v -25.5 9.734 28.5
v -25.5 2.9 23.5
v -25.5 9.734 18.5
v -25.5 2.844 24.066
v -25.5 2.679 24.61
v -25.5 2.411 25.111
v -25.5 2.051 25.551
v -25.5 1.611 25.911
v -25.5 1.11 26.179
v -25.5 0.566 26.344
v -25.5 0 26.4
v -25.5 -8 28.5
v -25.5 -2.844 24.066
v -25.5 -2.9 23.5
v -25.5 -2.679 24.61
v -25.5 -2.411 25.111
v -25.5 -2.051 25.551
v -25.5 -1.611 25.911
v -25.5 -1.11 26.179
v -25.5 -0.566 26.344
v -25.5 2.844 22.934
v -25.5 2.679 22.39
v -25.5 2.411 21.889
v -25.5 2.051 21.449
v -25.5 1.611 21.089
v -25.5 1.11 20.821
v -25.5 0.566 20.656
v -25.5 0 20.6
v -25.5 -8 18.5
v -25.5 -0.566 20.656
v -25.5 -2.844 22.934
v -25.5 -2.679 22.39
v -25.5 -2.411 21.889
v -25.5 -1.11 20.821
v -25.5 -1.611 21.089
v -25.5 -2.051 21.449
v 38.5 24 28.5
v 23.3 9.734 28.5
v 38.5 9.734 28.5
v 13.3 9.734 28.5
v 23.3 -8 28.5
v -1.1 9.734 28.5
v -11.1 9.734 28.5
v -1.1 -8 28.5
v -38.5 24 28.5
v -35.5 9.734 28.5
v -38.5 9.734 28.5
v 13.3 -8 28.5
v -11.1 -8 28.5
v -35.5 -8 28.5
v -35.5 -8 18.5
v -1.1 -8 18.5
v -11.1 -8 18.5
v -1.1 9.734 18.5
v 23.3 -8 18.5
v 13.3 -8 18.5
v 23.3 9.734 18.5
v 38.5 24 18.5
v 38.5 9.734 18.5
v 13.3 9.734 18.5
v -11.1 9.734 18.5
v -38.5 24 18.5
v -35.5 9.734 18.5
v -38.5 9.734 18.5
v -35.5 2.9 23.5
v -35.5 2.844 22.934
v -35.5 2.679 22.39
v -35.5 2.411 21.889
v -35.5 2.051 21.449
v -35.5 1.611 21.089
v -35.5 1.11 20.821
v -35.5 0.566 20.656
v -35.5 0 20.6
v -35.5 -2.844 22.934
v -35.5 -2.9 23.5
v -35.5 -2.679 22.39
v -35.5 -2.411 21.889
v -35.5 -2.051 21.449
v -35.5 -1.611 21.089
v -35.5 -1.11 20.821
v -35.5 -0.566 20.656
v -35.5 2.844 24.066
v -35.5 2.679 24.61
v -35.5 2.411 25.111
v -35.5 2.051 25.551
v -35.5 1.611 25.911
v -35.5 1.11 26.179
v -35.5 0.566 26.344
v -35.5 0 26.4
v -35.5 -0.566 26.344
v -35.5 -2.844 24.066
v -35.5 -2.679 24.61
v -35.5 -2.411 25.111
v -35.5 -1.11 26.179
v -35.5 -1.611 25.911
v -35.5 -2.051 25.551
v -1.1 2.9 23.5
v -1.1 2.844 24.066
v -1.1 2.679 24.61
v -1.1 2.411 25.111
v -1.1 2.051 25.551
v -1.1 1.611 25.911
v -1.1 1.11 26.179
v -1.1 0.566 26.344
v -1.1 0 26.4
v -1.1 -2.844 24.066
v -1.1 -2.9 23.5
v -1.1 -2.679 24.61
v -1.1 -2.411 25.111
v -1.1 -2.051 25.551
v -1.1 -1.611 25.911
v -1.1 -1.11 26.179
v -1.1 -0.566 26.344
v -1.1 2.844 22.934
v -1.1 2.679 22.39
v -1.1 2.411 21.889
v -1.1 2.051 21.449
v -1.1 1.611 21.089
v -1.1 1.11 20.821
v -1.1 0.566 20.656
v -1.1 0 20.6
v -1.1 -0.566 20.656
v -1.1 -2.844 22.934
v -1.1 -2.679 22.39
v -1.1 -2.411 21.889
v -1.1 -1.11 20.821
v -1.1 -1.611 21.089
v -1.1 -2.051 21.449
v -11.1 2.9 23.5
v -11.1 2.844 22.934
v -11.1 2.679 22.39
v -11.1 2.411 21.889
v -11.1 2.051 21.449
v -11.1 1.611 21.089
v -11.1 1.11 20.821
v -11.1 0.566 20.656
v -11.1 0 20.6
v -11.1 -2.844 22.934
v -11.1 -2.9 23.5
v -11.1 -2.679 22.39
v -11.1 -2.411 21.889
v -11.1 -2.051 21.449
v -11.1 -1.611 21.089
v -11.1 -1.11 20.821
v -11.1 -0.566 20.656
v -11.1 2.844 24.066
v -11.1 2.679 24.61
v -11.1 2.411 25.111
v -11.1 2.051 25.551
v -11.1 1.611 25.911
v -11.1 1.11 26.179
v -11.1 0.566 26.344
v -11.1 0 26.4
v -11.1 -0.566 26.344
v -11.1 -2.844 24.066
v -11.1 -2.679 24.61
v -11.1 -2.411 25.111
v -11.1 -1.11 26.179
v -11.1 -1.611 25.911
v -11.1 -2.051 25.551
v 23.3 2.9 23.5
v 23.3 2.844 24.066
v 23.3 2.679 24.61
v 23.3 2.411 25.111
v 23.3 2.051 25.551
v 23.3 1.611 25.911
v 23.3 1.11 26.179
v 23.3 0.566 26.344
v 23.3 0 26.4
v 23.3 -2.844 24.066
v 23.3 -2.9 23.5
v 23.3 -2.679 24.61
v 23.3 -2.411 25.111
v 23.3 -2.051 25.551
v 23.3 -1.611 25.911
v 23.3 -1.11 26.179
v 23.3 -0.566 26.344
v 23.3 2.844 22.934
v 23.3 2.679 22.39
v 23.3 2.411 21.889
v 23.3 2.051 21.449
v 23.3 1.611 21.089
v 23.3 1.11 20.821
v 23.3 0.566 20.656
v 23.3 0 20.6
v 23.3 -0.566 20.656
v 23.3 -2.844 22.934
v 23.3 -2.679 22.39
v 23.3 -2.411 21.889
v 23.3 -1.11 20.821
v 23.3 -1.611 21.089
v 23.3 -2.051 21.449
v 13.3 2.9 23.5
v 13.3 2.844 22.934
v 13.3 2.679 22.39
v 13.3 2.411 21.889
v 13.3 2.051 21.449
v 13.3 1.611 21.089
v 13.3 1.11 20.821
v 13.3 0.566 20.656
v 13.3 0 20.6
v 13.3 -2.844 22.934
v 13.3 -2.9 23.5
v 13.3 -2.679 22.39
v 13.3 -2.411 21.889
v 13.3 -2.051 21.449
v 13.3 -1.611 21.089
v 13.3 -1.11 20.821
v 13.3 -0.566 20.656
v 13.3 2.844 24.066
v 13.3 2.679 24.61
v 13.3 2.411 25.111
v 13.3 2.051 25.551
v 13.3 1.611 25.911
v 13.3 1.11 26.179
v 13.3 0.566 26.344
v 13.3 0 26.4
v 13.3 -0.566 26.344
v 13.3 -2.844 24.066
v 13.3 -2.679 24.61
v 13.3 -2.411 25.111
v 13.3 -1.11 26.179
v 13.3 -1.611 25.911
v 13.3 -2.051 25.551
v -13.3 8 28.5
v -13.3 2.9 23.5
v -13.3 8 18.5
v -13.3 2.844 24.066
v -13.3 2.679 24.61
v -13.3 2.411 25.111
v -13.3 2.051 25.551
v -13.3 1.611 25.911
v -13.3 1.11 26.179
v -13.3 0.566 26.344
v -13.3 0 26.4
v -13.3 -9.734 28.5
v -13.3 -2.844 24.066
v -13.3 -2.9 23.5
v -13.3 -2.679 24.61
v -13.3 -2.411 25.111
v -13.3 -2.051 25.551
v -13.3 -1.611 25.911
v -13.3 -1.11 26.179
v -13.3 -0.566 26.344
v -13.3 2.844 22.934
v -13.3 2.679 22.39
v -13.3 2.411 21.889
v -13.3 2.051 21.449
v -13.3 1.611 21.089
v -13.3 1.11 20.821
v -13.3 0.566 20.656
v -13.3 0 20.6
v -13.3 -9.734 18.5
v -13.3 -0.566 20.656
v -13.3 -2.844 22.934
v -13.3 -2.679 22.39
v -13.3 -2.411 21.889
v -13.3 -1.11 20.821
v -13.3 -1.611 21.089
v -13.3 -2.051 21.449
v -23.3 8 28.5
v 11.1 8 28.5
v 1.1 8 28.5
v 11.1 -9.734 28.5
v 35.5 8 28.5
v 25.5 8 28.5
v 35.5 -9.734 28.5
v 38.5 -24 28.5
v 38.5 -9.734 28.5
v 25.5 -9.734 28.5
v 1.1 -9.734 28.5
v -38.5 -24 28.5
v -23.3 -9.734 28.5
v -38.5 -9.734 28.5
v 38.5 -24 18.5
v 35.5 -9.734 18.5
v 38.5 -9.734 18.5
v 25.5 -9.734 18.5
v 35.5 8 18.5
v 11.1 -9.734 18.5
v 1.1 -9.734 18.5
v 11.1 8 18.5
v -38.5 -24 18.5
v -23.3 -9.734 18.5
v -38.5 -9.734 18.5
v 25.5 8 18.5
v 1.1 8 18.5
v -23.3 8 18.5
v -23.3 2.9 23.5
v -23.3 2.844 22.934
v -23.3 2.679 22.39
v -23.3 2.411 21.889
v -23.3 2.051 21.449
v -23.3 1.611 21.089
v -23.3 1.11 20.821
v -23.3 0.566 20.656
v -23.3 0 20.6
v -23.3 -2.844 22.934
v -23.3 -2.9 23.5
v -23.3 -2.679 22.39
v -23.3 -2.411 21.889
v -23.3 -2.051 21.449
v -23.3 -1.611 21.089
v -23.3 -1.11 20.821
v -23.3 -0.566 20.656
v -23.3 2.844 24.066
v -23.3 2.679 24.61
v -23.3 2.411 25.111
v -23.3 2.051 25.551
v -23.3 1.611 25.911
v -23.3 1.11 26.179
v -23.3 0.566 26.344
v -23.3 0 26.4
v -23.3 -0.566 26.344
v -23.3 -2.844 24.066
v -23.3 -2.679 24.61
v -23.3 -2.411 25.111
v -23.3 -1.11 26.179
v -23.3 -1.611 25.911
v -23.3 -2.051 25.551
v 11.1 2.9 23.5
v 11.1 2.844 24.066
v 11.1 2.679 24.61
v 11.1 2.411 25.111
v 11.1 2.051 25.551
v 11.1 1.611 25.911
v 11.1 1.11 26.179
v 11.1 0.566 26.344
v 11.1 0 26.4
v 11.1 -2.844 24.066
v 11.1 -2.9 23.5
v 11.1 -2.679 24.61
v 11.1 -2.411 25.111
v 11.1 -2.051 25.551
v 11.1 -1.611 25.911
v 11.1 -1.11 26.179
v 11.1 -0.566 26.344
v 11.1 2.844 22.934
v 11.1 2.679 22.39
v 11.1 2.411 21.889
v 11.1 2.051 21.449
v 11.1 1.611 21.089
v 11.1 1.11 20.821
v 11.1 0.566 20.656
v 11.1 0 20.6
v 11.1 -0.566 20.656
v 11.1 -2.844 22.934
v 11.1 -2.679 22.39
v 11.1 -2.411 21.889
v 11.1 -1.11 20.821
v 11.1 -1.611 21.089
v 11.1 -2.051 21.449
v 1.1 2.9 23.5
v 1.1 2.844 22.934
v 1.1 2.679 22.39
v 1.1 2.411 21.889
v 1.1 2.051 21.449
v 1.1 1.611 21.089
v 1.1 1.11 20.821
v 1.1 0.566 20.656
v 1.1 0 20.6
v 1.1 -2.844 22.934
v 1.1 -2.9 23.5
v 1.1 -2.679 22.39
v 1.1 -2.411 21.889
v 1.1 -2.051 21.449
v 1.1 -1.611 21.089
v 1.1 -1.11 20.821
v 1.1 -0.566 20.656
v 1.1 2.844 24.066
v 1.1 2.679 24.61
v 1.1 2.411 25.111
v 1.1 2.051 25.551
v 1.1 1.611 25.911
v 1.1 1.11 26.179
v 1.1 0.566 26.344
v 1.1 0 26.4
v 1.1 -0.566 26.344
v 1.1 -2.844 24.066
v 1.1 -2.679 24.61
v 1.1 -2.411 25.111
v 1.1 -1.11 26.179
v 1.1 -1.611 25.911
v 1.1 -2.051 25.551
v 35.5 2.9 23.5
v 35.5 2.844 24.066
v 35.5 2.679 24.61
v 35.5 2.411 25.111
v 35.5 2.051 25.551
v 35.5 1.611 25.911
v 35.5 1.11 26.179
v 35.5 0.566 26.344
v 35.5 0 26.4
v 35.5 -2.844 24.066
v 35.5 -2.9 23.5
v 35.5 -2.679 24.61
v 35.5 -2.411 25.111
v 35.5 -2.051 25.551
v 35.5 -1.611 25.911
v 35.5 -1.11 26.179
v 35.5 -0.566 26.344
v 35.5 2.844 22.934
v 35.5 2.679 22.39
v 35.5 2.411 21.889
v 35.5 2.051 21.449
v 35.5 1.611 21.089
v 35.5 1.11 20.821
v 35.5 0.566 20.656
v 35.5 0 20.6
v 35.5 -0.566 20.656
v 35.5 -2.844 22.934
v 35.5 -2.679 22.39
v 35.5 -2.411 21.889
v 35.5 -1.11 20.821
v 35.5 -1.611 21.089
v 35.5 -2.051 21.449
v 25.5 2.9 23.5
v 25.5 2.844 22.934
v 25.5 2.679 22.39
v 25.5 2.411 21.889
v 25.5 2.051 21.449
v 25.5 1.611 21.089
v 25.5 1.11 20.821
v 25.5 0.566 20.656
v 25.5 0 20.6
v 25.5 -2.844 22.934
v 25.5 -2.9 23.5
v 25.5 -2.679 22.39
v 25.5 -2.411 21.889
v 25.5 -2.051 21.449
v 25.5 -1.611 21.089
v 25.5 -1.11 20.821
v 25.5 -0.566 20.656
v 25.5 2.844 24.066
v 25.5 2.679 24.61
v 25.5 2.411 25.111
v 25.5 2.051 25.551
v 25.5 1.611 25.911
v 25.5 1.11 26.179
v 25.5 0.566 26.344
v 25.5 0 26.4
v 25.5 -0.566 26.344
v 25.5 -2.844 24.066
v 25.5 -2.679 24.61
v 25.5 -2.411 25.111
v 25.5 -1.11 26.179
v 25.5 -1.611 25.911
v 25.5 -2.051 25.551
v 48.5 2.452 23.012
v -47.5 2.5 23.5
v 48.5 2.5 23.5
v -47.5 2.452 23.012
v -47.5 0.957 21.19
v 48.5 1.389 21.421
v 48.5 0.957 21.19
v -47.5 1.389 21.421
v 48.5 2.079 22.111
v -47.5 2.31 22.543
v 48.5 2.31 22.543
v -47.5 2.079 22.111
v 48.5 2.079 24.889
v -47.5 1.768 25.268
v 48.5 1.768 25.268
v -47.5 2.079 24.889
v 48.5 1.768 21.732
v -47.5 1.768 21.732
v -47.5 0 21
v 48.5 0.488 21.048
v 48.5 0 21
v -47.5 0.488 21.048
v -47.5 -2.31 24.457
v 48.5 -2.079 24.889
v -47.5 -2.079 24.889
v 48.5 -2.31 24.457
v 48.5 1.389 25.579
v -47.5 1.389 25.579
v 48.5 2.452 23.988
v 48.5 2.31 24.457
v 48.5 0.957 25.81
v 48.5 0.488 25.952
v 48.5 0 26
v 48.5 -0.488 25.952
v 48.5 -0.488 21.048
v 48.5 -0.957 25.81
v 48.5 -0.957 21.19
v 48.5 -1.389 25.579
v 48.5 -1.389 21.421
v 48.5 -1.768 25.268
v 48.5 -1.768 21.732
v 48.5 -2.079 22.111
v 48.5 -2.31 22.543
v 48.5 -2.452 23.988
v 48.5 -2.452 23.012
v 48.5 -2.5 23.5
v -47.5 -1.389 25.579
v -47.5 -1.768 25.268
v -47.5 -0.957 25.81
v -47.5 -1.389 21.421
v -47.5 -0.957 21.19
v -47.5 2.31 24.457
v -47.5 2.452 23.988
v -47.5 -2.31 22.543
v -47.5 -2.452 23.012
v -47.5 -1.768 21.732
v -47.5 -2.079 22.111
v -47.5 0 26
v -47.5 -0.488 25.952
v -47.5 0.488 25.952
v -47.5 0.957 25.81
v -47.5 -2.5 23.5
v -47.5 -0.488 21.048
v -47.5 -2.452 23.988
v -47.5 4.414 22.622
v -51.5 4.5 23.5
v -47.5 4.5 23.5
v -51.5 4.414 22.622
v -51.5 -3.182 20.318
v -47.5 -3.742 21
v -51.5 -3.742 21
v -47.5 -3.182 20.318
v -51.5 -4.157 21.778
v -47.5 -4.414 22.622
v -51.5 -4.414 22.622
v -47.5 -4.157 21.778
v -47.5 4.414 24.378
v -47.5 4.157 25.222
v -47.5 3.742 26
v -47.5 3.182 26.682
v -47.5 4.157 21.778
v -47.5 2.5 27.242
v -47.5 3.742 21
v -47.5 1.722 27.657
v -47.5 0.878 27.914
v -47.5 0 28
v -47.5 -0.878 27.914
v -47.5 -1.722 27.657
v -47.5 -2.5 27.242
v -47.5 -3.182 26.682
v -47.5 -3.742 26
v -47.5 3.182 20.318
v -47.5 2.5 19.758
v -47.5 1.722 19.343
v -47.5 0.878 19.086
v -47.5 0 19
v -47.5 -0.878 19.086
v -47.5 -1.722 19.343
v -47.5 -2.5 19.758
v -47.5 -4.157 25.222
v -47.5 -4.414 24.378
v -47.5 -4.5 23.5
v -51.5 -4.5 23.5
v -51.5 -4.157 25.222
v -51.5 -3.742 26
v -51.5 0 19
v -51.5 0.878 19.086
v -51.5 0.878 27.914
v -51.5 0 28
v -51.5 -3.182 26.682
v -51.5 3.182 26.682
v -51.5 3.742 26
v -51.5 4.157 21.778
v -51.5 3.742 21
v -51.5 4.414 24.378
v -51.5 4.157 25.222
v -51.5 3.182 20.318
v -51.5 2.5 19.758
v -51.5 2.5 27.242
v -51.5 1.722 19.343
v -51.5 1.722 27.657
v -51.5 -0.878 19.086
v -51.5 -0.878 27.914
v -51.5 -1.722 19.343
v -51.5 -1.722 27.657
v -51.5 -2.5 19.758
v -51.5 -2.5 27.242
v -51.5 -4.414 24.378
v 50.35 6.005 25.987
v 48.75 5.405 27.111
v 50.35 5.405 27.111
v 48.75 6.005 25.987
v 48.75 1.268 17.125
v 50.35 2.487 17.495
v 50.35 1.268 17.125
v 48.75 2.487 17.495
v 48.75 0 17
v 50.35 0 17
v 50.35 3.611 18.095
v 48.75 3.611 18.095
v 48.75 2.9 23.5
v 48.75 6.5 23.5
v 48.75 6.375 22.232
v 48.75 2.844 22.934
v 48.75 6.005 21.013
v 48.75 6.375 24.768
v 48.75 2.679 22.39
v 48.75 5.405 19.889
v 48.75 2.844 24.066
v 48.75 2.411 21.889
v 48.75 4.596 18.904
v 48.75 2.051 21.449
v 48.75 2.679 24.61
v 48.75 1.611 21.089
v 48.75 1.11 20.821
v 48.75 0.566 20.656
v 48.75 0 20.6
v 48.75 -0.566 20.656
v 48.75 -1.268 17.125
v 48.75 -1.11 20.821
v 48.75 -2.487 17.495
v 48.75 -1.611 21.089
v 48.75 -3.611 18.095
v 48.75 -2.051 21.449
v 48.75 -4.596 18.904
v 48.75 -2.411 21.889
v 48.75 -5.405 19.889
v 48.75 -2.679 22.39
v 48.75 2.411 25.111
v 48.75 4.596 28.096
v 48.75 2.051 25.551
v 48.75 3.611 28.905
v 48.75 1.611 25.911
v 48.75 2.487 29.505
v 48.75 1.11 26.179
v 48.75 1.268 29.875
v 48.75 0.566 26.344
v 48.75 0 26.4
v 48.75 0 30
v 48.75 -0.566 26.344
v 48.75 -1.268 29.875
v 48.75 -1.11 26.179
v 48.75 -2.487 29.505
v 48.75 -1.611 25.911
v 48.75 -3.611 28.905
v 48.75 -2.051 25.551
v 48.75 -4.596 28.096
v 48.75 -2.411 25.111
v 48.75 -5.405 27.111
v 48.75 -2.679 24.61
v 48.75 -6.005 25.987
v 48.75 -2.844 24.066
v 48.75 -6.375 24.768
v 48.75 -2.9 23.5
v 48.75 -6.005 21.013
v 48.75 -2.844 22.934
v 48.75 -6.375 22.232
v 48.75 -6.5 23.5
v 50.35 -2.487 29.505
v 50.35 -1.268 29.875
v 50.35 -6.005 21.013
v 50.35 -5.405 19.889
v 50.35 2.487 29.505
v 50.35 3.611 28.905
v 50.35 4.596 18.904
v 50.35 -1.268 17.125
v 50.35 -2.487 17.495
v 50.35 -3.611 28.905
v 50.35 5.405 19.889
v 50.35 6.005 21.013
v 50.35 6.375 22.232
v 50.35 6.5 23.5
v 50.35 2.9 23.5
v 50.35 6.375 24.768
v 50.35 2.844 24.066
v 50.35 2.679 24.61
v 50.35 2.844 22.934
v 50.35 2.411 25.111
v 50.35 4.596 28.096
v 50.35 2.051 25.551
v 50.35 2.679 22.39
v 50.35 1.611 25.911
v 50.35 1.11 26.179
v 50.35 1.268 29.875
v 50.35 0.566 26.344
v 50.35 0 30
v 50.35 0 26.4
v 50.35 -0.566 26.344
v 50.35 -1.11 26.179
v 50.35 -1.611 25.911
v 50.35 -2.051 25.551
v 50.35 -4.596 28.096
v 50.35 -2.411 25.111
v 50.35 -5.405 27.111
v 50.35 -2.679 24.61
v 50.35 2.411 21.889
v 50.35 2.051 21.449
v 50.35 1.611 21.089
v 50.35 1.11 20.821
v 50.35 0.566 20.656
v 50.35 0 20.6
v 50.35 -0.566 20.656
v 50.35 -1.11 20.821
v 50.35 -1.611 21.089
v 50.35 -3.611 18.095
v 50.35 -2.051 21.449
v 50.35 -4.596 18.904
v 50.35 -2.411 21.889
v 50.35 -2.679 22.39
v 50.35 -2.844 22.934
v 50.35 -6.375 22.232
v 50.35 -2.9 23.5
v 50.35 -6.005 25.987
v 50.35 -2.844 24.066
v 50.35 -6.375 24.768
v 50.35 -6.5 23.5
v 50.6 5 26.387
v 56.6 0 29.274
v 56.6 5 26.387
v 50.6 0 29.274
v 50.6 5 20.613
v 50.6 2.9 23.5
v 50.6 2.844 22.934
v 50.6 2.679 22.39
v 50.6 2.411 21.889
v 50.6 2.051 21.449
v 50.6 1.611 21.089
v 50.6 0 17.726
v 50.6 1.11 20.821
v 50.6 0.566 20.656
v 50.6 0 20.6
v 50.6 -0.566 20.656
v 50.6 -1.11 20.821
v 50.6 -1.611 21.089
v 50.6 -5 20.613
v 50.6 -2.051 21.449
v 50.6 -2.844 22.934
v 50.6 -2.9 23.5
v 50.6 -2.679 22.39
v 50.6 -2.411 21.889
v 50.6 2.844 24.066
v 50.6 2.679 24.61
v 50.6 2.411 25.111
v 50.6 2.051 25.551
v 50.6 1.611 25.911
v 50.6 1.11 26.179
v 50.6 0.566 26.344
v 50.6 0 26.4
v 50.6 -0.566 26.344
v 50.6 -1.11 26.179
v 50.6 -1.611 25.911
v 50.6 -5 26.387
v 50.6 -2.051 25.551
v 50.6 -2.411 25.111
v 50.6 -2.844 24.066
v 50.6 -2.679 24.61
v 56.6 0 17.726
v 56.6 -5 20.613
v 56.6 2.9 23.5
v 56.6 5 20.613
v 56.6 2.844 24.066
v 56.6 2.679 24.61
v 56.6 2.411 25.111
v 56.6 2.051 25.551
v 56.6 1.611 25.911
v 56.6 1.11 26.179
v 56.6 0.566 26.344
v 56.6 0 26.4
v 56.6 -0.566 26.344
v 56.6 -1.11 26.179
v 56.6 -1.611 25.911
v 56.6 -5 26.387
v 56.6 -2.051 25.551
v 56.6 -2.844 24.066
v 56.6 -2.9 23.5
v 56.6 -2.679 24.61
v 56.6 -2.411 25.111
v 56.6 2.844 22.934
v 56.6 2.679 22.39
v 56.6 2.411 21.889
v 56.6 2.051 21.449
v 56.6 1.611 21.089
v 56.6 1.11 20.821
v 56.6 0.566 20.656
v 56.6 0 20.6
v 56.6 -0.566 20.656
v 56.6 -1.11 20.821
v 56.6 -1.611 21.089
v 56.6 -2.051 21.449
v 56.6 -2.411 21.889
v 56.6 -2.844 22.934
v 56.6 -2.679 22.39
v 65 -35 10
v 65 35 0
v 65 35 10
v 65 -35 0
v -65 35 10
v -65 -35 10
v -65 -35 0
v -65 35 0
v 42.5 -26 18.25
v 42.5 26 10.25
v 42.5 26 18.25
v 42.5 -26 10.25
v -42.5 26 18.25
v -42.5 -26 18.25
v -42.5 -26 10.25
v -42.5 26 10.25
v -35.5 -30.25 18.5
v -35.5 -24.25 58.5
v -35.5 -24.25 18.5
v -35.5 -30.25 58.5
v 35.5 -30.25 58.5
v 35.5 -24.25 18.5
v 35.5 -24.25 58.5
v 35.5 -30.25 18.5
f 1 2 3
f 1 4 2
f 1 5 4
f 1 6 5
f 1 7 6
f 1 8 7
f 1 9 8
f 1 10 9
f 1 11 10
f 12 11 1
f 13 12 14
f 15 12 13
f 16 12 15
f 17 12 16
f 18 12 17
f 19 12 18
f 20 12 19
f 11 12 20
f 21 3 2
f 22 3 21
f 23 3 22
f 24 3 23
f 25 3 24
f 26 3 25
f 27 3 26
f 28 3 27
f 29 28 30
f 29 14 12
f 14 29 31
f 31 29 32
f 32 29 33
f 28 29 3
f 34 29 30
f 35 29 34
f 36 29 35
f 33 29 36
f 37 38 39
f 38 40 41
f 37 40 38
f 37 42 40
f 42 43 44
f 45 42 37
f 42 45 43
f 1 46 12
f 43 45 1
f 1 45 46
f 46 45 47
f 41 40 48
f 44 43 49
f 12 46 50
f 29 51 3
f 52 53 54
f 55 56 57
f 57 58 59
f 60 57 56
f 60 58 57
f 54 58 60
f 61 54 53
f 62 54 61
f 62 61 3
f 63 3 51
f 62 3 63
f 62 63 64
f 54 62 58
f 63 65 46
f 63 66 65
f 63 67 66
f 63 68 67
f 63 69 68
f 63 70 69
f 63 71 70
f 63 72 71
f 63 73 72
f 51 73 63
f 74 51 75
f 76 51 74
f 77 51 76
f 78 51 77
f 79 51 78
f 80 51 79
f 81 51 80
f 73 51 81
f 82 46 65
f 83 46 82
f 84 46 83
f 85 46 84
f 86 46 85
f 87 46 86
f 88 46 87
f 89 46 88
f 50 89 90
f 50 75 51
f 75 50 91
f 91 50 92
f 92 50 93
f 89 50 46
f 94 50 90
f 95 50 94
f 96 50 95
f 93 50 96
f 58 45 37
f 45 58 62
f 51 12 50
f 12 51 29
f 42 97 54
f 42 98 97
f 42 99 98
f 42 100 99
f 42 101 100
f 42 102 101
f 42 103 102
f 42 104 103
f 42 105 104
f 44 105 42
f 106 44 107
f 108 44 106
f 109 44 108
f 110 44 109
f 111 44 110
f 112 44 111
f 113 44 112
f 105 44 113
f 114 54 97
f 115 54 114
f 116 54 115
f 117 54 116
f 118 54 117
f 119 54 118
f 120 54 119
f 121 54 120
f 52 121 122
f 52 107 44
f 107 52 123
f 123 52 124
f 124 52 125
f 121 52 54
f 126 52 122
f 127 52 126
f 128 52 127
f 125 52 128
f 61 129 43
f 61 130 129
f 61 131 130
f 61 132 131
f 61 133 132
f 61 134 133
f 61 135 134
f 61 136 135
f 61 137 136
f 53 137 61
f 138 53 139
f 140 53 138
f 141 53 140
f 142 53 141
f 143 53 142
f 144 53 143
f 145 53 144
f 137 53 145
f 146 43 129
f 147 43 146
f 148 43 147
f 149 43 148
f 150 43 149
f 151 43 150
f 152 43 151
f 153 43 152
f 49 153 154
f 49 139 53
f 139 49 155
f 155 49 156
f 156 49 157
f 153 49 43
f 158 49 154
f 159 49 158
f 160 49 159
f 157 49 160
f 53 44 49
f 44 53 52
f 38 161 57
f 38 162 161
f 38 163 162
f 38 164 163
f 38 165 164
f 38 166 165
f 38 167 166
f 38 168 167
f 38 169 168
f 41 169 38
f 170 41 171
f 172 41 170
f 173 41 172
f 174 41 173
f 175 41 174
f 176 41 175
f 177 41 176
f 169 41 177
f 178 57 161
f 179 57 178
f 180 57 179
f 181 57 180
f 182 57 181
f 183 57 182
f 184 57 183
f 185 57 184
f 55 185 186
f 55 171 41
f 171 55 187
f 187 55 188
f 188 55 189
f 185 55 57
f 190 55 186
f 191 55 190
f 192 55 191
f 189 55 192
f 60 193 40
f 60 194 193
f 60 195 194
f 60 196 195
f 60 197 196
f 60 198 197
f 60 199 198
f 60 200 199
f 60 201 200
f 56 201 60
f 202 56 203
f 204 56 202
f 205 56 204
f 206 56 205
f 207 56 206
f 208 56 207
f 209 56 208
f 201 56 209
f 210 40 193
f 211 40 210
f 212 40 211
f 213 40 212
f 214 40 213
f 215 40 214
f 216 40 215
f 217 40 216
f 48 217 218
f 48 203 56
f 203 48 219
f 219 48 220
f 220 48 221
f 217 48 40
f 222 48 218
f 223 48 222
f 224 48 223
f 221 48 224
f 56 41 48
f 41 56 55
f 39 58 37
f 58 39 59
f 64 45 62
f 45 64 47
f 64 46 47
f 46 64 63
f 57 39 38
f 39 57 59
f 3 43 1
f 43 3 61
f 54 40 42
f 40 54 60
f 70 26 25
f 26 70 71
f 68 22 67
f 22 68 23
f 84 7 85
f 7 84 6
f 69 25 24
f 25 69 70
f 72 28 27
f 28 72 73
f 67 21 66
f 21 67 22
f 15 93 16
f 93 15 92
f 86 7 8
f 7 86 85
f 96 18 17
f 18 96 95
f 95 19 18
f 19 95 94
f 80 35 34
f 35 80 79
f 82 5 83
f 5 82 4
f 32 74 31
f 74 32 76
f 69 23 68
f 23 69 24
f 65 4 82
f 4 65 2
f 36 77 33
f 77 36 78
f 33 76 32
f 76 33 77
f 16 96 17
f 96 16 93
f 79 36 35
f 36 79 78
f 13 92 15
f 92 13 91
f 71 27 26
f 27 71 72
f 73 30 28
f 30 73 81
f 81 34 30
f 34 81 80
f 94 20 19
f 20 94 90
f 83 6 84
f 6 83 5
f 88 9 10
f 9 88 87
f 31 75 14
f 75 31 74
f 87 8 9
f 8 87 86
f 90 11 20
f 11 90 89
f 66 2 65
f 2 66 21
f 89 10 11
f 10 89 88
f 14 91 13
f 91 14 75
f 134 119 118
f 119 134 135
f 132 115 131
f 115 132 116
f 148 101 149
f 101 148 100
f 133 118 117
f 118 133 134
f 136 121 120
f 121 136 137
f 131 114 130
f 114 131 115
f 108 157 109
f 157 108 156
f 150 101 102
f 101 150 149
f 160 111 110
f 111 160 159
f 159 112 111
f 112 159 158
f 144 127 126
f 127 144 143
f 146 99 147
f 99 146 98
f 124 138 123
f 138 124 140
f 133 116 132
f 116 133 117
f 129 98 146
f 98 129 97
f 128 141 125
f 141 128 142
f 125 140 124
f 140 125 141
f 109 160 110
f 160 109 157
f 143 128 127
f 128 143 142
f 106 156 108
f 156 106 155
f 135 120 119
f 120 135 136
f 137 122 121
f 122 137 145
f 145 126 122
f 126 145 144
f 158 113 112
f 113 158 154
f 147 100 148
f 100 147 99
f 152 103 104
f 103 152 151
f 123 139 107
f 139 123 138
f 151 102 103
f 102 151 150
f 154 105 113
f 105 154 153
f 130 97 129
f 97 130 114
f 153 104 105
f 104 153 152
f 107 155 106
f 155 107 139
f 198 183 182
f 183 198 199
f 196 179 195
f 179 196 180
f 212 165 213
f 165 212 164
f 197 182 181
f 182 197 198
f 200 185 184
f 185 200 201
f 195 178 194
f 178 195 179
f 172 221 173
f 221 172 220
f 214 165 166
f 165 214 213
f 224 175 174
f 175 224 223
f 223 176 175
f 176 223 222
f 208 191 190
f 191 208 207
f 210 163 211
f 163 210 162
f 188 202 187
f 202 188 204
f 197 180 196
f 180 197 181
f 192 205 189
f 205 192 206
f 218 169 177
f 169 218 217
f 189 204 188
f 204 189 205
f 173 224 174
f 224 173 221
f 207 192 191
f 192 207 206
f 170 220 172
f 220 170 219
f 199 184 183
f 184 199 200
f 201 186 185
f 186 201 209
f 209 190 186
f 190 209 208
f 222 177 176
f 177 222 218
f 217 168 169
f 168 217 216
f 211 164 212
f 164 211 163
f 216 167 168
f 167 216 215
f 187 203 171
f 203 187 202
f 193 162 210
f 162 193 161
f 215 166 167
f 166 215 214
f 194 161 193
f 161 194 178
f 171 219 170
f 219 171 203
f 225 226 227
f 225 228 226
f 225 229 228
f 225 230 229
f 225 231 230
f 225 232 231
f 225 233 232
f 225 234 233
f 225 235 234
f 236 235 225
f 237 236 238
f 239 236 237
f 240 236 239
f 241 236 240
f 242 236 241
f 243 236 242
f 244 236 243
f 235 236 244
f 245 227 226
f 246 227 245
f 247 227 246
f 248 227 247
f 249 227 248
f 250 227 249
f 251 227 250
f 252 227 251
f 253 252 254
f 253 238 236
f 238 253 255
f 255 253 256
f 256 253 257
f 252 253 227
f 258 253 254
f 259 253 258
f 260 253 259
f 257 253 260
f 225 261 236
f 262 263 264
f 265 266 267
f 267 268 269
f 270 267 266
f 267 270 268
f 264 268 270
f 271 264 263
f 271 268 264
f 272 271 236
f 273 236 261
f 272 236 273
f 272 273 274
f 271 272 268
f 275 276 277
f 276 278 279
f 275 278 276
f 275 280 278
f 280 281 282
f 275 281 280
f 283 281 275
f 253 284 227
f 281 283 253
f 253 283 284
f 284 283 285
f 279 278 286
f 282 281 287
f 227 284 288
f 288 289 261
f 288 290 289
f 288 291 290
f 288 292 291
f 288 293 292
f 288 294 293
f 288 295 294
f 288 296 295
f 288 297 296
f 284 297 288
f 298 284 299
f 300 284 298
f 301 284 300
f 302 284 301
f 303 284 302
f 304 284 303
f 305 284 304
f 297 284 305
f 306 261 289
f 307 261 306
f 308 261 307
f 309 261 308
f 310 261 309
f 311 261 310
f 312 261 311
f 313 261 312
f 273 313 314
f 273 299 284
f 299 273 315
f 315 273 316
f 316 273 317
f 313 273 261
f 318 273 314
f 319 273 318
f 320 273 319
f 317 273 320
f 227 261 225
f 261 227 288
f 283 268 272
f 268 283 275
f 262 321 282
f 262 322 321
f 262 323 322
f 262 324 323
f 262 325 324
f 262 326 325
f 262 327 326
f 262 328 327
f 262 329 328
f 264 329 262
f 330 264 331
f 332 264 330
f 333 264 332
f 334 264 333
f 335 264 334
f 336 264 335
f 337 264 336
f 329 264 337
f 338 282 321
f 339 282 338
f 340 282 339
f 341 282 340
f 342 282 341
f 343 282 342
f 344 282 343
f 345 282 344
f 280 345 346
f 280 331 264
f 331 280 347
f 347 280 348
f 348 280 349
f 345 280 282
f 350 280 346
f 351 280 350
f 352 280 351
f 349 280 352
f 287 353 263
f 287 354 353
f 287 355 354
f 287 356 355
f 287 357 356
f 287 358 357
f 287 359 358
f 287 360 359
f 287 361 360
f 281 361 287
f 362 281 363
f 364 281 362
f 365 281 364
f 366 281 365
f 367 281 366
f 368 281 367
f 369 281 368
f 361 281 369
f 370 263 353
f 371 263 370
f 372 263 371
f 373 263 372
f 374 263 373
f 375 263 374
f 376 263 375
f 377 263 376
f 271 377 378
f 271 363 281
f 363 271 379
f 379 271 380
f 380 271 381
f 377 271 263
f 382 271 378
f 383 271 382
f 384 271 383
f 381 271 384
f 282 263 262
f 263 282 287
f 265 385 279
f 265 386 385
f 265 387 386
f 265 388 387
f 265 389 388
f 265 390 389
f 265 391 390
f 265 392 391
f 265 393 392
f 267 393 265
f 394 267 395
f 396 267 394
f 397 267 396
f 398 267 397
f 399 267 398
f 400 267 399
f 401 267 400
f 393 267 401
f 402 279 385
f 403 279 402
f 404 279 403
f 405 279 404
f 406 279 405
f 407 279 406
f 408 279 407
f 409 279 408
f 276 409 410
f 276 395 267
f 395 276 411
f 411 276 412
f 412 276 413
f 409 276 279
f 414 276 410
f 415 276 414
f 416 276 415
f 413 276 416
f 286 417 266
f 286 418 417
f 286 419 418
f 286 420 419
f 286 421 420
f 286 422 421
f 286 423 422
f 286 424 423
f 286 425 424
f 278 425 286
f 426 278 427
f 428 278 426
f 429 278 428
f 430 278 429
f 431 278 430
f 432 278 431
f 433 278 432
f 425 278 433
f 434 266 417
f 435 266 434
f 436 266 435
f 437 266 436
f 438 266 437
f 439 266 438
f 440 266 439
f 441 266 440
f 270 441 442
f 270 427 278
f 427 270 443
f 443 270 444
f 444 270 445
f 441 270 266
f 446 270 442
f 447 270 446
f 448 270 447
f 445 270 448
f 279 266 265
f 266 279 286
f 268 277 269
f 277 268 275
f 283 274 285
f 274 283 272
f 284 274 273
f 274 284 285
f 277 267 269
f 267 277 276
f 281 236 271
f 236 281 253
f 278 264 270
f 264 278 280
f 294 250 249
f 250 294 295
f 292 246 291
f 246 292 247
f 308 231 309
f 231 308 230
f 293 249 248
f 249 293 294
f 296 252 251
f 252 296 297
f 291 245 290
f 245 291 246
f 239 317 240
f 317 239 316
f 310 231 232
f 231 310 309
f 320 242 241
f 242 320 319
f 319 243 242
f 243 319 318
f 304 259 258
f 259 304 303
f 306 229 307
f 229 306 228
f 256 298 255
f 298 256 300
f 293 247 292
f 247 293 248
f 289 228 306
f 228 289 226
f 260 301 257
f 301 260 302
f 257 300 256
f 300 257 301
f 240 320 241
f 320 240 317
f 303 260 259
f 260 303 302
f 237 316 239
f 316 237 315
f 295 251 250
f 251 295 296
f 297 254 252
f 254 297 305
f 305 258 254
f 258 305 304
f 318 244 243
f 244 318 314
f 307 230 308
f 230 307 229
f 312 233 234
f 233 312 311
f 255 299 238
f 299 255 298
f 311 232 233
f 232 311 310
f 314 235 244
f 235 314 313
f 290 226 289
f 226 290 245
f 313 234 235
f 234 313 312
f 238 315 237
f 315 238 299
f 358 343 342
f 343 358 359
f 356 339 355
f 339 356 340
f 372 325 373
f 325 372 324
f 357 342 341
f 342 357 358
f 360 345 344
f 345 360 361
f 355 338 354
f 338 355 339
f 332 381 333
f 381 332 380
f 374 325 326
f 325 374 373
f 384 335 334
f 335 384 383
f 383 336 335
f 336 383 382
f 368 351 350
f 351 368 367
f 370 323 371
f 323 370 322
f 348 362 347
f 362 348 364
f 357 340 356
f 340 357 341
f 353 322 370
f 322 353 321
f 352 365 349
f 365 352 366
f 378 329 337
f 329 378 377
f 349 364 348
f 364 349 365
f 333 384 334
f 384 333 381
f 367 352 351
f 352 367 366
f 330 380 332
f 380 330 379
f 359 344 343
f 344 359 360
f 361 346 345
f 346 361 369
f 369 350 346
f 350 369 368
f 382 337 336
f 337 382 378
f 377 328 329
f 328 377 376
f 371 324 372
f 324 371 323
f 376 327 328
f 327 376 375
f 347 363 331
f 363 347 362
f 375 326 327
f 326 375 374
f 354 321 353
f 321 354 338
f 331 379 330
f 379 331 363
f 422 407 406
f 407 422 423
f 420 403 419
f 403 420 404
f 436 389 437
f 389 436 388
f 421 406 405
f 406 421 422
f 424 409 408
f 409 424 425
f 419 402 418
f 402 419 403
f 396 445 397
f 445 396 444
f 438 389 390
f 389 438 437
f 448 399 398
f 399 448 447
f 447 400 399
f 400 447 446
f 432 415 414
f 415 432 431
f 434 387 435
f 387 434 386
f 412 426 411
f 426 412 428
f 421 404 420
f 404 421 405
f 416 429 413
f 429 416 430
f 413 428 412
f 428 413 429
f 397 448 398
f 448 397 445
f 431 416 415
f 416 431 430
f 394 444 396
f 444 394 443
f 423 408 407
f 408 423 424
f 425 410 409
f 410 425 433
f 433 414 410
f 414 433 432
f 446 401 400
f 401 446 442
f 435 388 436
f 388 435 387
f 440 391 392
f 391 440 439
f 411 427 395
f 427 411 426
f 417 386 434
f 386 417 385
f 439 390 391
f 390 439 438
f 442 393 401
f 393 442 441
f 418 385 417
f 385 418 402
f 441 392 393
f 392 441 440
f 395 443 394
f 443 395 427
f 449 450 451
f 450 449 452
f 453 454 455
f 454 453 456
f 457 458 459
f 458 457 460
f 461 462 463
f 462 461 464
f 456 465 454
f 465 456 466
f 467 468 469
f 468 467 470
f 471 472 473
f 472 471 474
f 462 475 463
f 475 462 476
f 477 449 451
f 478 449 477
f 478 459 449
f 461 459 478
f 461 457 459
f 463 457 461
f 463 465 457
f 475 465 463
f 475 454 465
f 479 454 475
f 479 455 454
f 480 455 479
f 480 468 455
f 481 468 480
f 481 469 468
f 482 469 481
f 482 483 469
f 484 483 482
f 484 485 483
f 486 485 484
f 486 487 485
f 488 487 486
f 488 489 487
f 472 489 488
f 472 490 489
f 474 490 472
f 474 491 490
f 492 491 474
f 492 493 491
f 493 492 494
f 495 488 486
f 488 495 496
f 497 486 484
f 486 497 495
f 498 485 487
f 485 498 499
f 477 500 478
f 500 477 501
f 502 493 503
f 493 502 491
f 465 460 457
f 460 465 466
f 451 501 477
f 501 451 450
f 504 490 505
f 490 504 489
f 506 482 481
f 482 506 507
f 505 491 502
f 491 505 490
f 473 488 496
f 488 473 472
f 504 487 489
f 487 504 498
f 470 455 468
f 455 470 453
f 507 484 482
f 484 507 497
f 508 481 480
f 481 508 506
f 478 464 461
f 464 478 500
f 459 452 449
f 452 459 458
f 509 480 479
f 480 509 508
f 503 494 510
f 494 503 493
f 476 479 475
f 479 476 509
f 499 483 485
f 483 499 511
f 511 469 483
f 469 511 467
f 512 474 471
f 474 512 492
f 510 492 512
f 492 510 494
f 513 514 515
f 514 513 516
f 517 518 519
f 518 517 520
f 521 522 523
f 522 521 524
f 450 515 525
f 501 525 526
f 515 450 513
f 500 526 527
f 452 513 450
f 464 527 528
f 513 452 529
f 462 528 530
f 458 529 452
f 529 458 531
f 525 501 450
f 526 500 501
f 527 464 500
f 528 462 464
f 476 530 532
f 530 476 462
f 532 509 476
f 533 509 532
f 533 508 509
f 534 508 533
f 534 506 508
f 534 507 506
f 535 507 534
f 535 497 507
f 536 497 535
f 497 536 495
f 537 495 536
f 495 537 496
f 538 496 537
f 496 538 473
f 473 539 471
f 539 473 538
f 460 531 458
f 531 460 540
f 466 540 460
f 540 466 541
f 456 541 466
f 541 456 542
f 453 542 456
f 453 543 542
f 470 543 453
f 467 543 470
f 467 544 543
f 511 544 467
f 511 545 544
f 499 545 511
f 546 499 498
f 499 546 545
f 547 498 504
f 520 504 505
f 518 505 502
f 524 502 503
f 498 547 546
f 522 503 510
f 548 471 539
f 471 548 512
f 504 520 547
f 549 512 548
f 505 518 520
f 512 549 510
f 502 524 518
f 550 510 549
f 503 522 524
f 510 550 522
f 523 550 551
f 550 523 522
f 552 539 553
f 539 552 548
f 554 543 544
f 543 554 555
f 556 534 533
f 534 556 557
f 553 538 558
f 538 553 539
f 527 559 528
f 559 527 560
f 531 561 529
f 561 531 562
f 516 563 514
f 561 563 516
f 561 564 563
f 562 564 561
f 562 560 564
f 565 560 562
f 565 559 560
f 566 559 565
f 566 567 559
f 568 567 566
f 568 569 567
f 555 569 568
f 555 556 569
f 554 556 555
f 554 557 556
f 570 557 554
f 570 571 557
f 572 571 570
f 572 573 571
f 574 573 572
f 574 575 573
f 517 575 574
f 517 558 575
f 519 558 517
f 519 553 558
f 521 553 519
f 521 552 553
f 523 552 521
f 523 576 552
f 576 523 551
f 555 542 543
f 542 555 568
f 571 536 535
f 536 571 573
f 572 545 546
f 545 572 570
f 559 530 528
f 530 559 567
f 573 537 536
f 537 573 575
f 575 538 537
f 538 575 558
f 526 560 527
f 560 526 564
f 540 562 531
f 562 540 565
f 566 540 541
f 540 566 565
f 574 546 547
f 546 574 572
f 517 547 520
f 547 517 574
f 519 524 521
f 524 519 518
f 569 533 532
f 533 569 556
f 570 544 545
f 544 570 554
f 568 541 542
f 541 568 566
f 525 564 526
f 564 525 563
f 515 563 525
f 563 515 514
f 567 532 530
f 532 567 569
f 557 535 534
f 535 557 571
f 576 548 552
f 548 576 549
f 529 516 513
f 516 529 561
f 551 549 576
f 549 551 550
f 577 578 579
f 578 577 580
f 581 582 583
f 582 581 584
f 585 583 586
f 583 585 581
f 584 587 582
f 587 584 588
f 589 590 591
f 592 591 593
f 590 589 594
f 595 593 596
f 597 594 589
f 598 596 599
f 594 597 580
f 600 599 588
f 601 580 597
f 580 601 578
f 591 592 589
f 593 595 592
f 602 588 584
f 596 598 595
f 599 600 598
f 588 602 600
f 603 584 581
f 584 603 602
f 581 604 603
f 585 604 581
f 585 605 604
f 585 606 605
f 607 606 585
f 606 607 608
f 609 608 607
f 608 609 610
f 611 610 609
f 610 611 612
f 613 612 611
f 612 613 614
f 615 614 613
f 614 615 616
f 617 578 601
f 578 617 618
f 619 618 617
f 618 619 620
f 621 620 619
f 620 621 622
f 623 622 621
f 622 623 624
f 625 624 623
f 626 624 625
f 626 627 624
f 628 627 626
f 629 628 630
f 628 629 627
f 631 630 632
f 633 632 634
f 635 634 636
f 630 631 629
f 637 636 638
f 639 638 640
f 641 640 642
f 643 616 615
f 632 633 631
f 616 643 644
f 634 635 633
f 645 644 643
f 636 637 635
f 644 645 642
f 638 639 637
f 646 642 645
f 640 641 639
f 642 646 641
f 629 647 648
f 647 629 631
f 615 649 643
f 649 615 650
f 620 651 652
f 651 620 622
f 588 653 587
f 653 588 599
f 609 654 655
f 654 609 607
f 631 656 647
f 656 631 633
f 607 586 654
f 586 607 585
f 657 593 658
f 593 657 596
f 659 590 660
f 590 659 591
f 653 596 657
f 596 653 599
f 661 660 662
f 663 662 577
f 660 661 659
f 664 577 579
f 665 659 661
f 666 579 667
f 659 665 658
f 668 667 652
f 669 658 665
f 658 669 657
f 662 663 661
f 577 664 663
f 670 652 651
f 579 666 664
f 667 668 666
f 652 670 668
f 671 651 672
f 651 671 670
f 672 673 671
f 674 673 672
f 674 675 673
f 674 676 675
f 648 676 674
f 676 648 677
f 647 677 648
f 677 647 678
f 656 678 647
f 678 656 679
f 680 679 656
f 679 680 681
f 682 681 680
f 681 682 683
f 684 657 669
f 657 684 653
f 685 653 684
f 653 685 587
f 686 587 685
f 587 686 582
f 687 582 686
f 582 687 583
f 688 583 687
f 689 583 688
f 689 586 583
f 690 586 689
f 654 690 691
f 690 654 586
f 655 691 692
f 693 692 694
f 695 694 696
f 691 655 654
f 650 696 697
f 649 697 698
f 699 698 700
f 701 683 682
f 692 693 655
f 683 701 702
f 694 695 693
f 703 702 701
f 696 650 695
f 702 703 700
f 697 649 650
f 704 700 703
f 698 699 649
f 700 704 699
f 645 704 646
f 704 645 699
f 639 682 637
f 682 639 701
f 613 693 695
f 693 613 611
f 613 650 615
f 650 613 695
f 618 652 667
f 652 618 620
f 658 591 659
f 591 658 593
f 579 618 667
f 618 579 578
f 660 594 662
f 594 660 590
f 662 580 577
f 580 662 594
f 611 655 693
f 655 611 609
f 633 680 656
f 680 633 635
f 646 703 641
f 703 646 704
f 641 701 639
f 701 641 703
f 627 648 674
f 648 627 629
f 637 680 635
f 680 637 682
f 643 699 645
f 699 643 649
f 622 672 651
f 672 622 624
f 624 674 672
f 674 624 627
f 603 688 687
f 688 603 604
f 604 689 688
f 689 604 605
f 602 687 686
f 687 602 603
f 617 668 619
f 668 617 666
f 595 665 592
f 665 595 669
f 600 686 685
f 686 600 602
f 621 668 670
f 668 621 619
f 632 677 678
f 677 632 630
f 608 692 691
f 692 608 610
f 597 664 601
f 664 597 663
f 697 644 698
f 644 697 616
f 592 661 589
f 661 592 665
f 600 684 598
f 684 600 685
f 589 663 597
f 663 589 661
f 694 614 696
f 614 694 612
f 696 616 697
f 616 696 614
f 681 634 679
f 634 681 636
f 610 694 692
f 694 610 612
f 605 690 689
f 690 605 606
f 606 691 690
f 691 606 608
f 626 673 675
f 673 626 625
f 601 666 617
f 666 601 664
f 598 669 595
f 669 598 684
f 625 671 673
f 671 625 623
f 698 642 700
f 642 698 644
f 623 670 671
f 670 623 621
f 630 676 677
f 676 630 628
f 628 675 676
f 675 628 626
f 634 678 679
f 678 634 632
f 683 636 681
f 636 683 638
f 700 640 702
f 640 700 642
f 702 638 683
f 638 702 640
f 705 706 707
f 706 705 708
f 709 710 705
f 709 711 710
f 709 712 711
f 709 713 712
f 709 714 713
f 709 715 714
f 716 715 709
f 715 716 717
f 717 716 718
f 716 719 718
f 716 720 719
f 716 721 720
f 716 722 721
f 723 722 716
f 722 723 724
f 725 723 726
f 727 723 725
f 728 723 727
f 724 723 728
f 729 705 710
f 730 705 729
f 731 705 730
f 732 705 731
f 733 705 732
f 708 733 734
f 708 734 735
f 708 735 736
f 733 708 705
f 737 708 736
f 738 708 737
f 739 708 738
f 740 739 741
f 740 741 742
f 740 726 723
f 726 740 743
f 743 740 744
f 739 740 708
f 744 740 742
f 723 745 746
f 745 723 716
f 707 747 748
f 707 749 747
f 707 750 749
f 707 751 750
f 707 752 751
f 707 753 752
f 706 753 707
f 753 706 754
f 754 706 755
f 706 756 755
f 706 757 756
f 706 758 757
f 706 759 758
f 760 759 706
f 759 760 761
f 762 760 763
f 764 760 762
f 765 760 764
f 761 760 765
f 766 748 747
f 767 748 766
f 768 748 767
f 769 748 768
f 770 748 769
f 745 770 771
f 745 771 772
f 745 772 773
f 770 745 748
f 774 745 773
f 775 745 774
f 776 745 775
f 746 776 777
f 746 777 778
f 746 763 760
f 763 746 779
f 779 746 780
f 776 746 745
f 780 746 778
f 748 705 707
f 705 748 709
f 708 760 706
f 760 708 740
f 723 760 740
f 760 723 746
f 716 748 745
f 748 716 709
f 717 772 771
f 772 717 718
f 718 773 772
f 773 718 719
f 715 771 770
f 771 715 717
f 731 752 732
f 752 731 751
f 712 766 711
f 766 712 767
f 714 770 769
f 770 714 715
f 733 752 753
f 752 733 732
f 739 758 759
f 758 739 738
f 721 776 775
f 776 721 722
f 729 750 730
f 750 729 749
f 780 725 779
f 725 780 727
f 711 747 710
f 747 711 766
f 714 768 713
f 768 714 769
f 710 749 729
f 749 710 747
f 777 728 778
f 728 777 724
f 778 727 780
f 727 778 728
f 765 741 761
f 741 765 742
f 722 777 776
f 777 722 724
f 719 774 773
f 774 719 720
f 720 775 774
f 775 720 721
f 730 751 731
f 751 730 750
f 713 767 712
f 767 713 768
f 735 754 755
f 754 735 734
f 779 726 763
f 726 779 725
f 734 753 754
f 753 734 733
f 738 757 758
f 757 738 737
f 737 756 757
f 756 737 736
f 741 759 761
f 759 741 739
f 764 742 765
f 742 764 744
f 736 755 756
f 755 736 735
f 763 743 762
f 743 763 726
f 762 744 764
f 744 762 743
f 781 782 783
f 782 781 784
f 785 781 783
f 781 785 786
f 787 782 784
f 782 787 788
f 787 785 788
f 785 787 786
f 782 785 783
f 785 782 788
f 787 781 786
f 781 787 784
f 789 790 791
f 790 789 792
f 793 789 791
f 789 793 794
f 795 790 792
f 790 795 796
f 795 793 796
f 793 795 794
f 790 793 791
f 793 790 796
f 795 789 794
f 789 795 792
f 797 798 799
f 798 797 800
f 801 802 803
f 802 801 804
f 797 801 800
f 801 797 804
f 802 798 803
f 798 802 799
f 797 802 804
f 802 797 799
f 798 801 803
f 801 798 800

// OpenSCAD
$fn = 32;

// ------------------------------------------------------------------------
// Comb hinge with flap: leaf 77 x 24 mm, pin d5, flap 40 mm
// Every part is its own module, assembly() places every instance.
// ------------------------------------------------------------------------

// --- part 1 ---
module hinge_bed() {
  difference() {
    translate([-65, -35, 0]) cube([130, 70, 10]);
  }
}

// --- part 2 ---
module hinge_riser() {
  difference() {
    translate([-42.5, -26, 0]) cube([85, 52, 8]);
  }
}

// --- part 3 ---
module hinge_leaf_a() {
  difference() {
    union() {
      translate([-35.5, -8, -5]) cube([10, 32, 10]);
      translate([-11.1, -8, -5]) cube([10, 32, 10]);
      translate([13.3, -8, -5]) cube([10, 32, 10]);
      translate([-38.5, 9.734, -5]) cube([77, 14.266, 10]);
    }
    translate([-30.5, 0, 0]) rotate([0, 90, 0]) cylinder(h = 12, d = 5.8, center = true);
    translate([-6.1, 0, 0]) rotate([0, 90, 0]) cylinder(h = 12, d = 5.8, center = true);
    translate([18.3, 0, 0]) rotate([0, 90, 0]) cylinder(h = 12, d = 5.8, center = true);
  }
}

// --- part 4 ---
module hinge_leaf_b() {
  difference() {
    union() {
      translate([-23.3, -24, -5]) cube([10, 32, 10]);
      translate([1.1, -24, -5]) cube([10, 32, 10]);
      translate([25.5, -24, -5]) cube([10, 32, 10]);
      translate([-38.5, -24, -5]) cube([77, 14.266, 10]);
    }
    translate([-18.3, 0, 0]) rotate([0, 90, 0]) cylinder(h = 12, d = 5.8, center = true);
    translate([6.1, 0, 0]) rotate([0, 90, 0]) cylinder(h = 12, d = 5.8, center = true);
    translate([30.5, 0, 0]) rotate([0, 90, 0]) cylinder(h = 12, d = 5.8, center = true);
  }
}

// --- part 5 ---
module hinge_flap() {
  difference() {
    translate([-35.5, -20, 0]) cube([71, 40, 6]);
  }
}

// --- part 6 ---
module hinge_pin() {
  rotate([0, 90, 0]) cylinder(h = 97, d = 5, center = true);
  translate([-51.5, 0, 0]) rotate([0, 90, 0]) cylinder(h = 4, d = 9);
}

// --- part 7 ---
module pin_washer() {
  difference() {
      translate([0, 0, 0]) cylinder(h = 1.6, d = 13);
      translate([0, 0, -1]) cylinder(h = 3.6, d = 5.8);
    }
}

// --- part 8 ---
module pin_nut() {
  difference() {
    linear_extrude(height = 6) polygon(points = [[5.774, 0], [2.887, 5], [-2.887, 5], [-5.774, 0], [-2.887, -5], [2.887, -5]]);
    translate([0, 0, -1]) cylinder(h = 8, d = 5.8);
  }
}

// --- assembly ---
module assembly() {
  color([0.80, 0.24, 0.20]) translate([0, 0, 0]) rotate([0, 0, 0]) hinge_bed();
  color([0.20, 0.45, 0.75]) translate([0, 0, 10.25]) rotate([0, 0, 0]) hinge_riser();
  color([0.25, 0.62, 0.32]) translate([0, 0, 23.5]) rotate([0, 0, 0]) hinge_leaf_a();
  color([0.92, 0.70, 0.18]) translate([0, 0, 23.5]) rotate([0, 0, 0]) hinge_leaf_b();
  color([0.58, 0.35, 0.70]) translate([0, -24.25, 38.5]) rotate([90, 0, 0]) hinge_flap();
  color([0.16, 0.66, 0.66]) translate([0, 0, 23.5]) rotate([0, 0, 0]) hinge_pin();
  color([0.85, 0.48, 0.18]) translate([48.75, 0, 23.5]) rotate([0, 90, 0]) pin_washer();
  color([0.55, 0.60, 0.65]) translate([50.6, 0, 23.5]) rotate([0, 90, 0]) pin_nut();
}

assembly();
